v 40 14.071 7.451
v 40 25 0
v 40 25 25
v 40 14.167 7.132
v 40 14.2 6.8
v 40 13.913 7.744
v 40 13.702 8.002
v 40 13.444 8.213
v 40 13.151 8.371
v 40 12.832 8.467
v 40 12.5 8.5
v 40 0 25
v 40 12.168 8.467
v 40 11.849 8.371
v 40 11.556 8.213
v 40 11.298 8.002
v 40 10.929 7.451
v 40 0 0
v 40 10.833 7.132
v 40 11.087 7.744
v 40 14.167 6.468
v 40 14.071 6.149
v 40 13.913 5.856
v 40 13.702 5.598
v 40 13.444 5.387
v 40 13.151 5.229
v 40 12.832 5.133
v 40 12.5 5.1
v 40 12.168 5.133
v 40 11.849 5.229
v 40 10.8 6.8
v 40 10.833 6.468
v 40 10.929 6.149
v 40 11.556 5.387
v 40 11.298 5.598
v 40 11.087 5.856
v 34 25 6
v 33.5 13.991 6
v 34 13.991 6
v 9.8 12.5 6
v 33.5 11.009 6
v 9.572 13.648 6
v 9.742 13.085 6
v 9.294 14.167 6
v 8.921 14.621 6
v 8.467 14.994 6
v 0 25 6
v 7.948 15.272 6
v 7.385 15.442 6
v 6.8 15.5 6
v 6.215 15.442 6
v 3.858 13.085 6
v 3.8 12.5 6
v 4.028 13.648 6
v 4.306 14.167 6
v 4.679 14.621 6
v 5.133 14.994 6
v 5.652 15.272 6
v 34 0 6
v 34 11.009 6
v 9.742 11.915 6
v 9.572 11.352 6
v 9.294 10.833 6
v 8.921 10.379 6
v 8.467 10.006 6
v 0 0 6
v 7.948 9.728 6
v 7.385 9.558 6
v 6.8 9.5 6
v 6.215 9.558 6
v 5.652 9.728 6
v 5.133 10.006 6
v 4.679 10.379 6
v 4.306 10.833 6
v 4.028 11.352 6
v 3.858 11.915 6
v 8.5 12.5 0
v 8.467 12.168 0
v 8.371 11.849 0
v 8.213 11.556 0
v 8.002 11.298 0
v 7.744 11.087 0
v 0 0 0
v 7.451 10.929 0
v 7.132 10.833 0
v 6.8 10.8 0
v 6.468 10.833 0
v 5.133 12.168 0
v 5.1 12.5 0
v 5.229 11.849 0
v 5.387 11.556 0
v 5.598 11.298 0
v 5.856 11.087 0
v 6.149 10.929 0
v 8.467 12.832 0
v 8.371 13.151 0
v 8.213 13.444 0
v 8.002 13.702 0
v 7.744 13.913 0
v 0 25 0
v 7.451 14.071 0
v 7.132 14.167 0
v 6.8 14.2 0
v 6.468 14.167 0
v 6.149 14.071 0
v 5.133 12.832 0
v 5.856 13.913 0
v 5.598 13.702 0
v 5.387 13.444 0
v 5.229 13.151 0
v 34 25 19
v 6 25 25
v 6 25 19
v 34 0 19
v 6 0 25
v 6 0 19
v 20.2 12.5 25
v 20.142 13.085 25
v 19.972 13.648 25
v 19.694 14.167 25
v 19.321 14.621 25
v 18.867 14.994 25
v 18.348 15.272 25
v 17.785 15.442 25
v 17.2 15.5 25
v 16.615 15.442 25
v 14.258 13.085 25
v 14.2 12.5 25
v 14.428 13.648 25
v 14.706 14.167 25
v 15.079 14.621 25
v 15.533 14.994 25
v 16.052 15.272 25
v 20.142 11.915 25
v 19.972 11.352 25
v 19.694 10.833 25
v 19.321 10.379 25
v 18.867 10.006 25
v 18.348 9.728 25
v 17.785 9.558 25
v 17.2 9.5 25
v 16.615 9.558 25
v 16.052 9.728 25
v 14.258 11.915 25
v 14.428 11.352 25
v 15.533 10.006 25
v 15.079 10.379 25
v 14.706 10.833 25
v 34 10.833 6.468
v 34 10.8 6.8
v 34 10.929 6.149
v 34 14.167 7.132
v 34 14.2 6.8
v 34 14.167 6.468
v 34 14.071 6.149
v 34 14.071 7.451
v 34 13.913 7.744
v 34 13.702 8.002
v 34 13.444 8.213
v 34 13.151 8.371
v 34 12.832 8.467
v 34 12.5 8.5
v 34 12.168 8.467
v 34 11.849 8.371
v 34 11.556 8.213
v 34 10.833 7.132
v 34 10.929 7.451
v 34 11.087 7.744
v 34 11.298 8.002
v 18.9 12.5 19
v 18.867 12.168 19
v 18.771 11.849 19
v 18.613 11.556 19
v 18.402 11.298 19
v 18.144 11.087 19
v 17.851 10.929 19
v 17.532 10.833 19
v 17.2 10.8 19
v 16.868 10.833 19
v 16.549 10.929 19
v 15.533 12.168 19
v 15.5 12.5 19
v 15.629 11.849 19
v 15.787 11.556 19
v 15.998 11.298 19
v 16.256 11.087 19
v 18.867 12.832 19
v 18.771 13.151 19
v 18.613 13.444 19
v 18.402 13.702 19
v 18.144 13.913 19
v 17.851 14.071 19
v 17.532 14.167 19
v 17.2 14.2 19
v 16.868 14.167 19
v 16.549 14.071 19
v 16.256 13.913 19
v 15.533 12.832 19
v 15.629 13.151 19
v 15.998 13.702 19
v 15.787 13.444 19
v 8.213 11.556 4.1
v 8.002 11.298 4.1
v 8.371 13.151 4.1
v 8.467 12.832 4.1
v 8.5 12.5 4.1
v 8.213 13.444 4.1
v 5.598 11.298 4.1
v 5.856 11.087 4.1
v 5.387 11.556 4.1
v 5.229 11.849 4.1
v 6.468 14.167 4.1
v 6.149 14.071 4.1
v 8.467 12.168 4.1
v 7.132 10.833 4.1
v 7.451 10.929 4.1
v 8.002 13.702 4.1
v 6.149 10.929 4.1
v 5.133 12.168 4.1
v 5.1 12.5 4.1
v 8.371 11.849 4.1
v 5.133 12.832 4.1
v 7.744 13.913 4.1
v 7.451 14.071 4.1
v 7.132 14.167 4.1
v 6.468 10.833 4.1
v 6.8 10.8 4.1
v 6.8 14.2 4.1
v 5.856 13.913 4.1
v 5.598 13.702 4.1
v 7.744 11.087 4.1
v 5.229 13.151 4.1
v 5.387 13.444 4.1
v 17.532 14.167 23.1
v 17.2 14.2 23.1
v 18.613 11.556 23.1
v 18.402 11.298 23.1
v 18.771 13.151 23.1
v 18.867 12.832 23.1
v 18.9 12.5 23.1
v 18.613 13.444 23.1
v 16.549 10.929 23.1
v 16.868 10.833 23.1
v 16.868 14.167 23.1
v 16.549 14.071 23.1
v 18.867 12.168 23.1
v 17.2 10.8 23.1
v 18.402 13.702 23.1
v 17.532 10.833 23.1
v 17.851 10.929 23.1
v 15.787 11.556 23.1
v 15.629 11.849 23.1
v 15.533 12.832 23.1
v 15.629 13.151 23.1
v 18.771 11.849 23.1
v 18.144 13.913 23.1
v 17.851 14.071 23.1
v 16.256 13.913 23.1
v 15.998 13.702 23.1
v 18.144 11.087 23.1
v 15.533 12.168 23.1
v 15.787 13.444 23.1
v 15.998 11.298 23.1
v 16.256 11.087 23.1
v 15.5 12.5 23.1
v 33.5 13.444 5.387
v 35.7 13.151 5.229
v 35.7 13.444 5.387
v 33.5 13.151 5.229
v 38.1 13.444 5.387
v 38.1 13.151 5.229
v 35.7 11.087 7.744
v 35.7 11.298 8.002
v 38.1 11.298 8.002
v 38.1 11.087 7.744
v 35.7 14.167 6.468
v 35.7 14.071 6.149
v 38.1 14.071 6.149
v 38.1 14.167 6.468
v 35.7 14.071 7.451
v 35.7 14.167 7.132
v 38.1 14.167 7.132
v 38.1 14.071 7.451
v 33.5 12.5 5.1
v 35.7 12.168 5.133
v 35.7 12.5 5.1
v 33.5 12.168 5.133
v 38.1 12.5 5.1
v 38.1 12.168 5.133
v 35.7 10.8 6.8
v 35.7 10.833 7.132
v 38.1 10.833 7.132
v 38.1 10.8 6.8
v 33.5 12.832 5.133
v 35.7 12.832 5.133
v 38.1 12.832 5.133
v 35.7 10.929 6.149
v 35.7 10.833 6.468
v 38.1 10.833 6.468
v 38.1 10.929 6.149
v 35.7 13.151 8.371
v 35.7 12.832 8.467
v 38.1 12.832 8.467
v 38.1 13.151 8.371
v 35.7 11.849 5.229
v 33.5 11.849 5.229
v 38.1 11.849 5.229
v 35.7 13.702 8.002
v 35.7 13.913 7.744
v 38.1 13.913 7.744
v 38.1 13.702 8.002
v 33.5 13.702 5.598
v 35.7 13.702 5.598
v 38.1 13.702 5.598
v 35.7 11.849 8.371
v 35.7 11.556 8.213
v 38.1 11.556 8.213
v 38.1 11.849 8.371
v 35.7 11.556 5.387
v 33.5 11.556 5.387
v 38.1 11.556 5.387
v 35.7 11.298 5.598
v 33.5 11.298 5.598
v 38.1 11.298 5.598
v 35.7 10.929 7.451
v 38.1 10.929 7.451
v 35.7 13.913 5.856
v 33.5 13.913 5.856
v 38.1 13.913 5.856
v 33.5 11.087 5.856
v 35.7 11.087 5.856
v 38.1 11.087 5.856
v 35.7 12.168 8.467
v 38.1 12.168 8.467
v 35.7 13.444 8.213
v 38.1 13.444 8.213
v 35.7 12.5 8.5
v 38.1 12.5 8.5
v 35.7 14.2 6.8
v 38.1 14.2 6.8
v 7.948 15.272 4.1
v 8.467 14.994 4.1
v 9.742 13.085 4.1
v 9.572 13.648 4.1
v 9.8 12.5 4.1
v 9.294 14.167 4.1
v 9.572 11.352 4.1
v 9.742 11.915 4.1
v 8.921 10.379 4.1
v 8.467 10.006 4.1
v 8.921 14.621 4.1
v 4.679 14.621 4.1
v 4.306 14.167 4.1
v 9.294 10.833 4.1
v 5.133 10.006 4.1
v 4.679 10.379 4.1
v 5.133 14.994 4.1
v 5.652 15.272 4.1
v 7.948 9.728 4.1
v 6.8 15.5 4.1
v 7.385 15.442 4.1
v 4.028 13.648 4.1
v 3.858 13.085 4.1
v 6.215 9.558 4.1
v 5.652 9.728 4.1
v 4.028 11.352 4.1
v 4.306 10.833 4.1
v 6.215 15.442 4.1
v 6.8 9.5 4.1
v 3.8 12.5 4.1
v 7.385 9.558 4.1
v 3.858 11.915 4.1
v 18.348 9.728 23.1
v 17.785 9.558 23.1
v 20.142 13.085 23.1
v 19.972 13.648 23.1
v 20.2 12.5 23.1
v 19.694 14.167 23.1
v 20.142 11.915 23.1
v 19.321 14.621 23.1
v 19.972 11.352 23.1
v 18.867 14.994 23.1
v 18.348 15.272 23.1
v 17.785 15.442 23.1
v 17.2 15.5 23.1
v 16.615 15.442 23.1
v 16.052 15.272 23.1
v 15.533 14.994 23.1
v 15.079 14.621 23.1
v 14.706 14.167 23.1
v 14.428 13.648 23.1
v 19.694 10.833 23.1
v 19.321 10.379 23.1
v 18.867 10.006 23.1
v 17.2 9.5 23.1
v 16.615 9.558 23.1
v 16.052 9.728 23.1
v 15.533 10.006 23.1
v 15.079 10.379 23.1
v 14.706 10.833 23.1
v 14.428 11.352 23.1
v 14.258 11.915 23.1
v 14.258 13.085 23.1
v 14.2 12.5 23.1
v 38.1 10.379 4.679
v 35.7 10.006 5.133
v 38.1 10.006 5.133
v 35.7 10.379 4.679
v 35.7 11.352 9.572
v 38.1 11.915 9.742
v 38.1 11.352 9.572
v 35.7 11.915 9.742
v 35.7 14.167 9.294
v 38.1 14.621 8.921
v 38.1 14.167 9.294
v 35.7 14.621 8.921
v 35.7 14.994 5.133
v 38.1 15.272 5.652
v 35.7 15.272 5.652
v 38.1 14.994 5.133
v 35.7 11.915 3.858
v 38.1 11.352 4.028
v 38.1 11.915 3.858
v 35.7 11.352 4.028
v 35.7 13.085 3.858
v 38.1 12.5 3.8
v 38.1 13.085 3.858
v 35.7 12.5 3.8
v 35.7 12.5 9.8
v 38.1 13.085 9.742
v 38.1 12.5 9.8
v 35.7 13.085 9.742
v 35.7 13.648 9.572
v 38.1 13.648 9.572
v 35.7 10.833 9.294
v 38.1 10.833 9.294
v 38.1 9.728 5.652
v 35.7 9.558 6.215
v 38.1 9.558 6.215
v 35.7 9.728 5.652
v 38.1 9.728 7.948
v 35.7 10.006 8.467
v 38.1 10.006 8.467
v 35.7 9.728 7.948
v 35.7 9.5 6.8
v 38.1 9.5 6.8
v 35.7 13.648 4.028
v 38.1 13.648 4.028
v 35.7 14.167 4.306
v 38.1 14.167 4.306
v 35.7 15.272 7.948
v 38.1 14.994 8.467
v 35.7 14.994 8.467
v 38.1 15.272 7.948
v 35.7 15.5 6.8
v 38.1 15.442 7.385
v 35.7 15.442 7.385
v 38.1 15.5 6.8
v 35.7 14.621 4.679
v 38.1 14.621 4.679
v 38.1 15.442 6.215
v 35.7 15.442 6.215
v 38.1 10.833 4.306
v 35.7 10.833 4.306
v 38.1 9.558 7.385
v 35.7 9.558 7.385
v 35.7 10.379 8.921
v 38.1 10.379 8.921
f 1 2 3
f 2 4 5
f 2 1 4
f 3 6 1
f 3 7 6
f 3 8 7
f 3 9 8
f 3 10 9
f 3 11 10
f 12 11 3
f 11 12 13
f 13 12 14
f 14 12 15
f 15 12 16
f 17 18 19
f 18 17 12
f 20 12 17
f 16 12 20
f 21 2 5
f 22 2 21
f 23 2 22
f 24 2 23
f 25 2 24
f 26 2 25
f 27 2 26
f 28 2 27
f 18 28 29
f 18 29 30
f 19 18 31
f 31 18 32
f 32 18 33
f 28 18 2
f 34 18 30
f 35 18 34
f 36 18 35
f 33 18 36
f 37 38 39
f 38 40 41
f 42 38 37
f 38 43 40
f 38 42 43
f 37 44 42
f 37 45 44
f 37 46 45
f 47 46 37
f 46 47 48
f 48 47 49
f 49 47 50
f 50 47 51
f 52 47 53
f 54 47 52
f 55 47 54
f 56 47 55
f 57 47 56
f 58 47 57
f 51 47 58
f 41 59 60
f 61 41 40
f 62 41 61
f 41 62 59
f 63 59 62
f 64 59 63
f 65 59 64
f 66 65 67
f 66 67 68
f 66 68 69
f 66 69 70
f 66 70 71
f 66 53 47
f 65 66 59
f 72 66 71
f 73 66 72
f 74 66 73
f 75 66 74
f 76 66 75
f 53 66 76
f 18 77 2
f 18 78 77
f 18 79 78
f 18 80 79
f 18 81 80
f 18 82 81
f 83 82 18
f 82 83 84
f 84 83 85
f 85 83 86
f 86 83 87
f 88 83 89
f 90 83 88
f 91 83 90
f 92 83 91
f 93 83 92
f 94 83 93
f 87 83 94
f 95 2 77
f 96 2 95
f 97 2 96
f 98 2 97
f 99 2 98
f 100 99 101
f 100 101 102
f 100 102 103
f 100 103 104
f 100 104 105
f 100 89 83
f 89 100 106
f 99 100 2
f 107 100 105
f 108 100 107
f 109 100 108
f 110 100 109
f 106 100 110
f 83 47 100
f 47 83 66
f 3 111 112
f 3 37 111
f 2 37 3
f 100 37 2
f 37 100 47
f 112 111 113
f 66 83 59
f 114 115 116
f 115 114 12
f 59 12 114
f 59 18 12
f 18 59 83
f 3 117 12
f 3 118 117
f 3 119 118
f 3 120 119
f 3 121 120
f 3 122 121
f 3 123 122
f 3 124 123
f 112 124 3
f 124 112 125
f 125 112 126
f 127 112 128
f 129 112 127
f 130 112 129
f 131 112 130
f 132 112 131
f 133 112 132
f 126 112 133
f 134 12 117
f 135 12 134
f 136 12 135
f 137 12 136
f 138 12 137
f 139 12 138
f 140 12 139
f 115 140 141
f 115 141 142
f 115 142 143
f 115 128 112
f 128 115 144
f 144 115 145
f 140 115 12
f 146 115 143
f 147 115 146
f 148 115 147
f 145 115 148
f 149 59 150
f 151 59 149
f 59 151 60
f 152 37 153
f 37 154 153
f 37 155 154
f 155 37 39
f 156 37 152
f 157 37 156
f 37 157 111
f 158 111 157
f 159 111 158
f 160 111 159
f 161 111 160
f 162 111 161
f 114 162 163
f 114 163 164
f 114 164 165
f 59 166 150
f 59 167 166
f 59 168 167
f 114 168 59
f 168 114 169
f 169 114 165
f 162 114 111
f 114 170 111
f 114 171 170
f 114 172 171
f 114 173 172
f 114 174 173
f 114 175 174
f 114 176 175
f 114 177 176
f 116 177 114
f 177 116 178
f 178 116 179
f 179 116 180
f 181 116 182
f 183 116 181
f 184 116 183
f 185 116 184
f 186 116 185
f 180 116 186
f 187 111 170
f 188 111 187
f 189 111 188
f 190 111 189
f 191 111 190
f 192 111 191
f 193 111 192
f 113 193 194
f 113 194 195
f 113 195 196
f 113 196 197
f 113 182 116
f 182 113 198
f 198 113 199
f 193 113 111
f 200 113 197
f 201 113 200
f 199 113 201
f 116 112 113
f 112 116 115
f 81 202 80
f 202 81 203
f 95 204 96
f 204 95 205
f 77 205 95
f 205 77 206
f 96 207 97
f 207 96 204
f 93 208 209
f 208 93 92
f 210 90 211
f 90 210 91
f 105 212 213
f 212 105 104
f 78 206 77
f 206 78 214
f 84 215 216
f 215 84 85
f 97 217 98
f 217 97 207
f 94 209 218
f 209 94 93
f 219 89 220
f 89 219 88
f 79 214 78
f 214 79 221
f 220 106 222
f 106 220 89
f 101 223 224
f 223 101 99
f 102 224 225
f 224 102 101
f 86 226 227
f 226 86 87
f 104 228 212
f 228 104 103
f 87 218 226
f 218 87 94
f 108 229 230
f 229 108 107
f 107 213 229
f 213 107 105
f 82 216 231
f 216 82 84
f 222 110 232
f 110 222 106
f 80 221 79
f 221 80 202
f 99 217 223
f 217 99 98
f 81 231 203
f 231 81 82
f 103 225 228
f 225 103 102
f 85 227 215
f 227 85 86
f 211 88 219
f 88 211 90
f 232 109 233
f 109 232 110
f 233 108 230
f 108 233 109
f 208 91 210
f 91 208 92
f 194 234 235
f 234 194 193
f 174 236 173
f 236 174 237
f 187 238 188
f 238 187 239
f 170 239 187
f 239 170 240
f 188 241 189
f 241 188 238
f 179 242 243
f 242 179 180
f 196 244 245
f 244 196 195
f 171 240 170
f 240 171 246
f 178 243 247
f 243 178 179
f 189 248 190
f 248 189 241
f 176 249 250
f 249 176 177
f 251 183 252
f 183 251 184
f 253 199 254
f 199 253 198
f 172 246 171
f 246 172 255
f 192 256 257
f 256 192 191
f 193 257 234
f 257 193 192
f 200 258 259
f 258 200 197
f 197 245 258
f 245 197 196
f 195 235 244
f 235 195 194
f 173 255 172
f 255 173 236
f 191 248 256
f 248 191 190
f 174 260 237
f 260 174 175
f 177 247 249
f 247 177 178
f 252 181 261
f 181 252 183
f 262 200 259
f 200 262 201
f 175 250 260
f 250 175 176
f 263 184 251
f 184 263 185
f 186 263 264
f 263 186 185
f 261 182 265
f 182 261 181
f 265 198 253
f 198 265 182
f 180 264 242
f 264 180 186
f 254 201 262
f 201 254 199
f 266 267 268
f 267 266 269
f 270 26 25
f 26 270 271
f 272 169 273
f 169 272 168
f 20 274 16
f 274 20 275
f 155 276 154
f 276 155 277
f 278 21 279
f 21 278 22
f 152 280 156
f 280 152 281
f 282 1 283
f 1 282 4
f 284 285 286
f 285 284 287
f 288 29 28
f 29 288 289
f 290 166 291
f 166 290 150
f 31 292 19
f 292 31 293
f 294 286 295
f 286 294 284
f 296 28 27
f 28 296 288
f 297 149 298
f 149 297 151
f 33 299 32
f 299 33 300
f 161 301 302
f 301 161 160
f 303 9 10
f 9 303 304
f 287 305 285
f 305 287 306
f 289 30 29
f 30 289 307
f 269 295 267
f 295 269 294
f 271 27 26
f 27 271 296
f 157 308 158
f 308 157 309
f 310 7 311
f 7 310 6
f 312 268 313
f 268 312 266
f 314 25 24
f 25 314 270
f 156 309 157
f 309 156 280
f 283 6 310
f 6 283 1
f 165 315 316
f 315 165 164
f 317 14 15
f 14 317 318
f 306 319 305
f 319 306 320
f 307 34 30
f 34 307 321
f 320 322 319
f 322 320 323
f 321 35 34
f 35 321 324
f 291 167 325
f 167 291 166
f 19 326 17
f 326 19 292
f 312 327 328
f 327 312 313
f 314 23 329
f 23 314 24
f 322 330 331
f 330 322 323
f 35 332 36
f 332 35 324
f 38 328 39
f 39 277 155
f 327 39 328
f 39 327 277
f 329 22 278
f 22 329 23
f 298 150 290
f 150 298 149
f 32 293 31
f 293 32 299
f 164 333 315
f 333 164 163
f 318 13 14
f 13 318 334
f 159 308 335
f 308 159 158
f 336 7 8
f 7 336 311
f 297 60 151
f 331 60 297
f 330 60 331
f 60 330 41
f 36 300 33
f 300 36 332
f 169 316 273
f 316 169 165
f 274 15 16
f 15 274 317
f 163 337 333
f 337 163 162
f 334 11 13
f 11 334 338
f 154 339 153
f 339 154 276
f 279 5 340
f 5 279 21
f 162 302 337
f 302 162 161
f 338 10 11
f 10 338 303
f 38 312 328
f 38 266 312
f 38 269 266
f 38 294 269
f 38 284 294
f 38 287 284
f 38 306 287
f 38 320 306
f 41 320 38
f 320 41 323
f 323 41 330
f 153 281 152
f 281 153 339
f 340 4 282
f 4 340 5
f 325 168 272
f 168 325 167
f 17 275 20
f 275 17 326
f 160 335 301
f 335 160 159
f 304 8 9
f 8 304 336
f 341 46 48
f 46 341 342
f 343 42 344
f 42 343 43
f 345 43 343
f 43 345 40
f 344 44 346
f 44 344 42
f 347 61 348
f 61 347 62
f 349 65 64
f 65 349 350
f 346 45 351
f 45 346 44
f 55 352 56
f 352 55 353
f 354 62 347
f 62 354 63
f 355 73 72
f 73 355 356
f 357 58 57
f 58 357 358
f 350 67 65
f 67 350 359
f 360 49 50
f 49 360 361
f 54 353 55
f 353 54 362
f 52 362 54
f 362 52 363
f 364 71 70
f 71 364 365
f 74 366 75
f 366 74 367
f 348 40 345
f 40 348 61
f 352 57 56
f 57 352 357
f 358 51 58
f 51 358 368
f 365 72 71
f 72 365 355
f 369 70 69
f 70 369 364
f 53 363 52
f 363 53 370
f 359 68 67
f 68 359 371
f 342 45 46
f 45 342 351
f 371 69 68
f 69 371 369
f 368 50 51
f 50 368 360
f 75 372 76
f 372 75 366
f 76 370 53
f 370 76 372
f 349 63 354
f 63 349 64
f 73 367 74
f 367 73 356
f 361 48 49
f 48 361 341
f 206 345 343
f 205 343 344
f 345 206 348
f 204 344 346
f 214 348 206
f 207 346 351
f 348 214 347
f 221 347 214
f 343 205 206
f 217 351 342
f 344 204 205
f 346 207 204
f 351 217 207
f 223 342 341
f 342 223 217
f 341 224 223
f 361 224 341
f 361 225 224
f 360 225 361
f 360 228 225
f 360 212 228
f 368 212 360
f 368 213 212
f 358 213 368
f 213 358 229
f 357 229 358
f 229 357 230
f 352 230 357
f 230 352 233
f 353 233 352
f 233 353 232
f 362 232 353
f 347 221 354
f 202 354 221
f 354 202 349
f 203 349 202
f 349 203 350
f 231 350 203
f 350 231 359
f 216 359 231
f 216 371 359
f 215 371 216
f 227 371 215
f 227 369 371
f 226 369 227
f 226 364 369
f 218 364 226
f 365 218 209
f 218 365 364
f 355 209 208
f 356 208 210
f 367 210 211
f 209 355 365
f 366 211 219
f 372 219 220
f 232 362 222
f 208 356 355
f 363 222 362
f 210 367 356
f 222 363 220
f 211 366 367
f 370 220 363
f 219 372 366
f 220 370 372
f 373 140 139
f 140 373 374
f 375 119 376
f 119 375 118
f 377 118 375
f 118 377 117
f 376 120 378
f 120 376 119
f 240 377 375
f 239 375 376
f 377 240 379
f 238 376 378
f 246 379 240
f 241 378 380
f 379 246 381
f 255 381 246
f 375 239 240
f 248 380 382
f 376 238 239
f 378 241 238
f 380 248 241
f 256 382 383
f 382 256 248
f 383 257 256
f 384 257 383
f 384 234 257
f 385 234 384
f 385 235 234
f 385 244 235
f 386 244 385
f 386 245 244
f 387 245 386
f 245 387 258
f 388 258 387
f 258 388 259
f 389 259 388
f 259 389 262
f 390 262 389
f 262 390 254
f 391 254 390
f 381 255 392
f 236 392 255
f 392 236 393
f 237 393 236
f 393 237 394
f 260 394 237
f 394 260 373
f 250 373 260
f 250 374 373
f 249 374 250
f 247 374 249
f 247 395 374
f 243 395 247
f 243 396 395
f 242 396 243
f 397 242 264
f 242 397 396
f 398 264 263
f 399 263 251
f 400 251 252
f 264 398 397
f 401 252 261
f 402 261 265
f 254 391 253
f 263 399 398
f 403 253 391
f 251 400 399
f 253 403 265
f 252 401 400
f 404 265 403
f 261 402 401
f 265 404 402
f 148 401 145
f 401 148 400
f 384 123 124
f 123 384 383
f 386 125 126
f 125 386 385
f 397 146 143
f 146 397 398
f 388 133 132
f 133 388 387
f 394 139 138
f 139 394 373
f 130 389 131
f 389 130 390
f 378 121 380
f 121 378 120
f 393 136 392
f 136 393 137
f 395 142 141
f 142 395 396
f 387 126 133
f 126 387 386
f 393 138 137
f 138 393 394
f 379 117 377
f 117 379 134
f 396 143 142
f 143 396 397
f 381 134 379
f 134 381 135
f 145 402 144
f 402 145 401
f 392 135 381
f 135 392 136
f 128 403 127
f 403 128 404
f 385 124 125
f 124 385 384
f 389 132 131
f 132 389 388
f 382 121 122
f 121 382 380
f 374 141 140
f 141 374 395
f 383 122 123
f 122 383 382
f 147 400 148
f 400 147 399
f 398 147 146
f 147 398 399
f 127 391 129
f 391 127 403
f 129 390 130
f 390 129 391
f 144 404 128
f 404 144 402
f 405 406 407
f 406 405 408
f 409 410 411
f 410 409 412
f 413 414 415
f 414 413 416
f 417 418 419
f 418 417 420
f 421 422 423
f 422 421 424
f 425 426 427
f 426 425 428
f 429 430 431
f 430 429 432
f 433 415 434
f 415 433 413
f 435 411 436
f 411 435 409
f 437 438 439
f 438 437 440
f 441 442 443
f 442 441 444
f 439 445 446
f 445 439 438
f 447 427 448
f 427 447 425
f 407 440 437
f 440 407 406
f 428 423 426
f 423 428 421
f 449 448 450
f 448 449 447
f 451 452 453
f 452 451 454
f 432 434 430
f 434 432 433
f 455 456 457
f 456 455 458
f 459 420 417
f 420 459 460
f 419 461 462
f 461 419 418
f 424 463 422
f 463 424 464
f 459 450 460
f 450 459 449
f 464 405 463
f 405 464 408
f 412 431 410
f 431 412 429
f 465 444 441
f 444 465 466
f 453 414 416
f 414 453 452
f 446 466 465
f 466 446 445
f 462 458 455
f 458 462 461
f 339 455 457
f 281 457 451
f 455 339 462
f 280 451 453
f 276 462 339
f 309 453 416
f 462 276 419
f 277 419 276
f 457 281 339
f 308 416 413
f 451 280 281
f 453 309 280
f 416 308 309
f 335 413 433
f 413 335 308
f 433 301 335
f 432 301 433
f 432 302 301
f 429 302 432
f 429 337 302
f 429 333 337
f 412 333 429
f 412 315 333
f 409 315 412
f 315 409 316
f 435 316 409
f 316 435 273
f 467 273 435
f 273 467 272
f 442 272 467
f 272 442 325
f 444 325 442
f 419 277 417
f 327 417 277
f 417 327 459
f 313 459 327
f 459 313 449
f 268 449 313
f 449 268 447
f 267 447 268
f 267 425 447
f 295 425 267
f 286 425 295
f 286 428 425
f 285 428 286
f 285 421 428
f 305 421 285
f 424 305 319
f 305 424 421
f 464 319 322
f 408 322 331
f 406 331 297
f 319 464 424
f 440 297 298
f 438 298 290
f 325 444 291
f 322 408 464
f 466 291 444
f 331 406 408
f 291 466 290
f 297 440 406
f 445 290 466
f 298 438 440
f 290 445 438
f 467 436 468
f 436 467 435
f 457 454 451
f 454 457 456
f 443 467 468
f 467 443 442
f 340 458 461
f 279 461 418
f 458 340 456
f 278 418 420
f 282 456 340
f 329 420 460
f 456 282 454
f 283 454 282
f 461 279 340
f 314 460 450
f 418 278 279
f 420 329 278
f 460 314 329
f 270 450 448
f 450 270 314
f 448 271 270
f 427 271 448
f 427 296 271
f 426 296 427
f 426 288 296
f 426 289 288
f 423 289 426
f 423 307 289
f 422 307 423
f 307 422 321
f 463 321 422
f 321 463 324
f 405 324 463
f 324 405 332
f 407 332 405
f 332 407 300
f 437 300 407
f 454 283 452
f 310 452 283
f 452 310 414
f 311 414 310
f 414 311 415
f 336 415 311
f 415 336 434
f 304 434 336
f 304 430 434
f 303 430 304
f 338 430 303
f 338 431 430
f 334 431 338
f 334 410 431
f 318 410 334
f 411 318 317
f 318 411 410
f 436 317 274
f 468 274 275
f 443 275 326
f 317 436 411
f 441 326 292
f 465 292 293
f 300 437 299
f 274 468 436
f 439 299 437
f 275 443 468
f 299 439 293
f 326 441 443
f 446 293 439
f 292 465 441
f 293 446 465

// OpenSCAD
$fn = 32;

// ----------------------------------------------------------------------
// Z-bracket: 40 x 25 x 25 mm
// ----------------------------------------------------------------------

// --- parameters (mm) ---
foot_len = 40;            // lower foot length, X
top_len = 28;             // upper foot length, X
depth = 25;               // bracket width, Y
step_h = 25;              // overall rise, Z
plate_t = 6;              // plate thickness
hole_d = 3.4;             // clearance for M3
cb_d = 6;                 // counterbore diameter
cb_h = 1.9;               // counterbore depth

module hole_z(px, py, z0) {
  translate([px, py, z0 - 0.5]) cylinder(h = plate_t + 1, d = hole_d);
}
module hole_x(py, pz) {
  translate([-0.5, py, pz]) rotate([0, 90, 0]) cylinder(h = plate_t + 1, d = hole_d);
}
module cb_z(px, py, top_z) {
  translate([px, py, top_z - cb_h]) cylinder(h = cb_h + 0.5, d = cb_d);
}
module cb_x(py, pz) {
  translate([plate_t - cb_h, py, pz]) rotate([0, -90, 0]) cylinder(h = cb_h + 0.5, d = cb_d);
}

difference() {
  union() {
    cube([foot_len, depth, plate_t]);
    /* web, overlapping the lower foot */
    translate([foot_len - plate_t, 0, 0]) cube([plate_t, depth, step_h]);
    /* upper foot, sunk into the web */
    translate([foot_len - plate_t - top_len, 0, step_h - plate_t]) cube([top_len + plate_t, depth, plate_t]);
  }
  hole_z(6.8, 12.5, 0);
  translate([foot_len - plate_t - 16.8, 0, 0]) hole_z(0, 12.5, step_h - plate_t);
  translate([foot_len - plate_t, 0, 0]) hole_x(12.5, 6.8);
  cb_z(6.8, 12.5, plate_t);
  translate([foot_len - plate_t - 16.8, 0, 0]) cb_z(0, 12.5, step_h);
  translate([foot_len - plate_t, 0, 0]) cb_x(12.5, 6.8);
}
